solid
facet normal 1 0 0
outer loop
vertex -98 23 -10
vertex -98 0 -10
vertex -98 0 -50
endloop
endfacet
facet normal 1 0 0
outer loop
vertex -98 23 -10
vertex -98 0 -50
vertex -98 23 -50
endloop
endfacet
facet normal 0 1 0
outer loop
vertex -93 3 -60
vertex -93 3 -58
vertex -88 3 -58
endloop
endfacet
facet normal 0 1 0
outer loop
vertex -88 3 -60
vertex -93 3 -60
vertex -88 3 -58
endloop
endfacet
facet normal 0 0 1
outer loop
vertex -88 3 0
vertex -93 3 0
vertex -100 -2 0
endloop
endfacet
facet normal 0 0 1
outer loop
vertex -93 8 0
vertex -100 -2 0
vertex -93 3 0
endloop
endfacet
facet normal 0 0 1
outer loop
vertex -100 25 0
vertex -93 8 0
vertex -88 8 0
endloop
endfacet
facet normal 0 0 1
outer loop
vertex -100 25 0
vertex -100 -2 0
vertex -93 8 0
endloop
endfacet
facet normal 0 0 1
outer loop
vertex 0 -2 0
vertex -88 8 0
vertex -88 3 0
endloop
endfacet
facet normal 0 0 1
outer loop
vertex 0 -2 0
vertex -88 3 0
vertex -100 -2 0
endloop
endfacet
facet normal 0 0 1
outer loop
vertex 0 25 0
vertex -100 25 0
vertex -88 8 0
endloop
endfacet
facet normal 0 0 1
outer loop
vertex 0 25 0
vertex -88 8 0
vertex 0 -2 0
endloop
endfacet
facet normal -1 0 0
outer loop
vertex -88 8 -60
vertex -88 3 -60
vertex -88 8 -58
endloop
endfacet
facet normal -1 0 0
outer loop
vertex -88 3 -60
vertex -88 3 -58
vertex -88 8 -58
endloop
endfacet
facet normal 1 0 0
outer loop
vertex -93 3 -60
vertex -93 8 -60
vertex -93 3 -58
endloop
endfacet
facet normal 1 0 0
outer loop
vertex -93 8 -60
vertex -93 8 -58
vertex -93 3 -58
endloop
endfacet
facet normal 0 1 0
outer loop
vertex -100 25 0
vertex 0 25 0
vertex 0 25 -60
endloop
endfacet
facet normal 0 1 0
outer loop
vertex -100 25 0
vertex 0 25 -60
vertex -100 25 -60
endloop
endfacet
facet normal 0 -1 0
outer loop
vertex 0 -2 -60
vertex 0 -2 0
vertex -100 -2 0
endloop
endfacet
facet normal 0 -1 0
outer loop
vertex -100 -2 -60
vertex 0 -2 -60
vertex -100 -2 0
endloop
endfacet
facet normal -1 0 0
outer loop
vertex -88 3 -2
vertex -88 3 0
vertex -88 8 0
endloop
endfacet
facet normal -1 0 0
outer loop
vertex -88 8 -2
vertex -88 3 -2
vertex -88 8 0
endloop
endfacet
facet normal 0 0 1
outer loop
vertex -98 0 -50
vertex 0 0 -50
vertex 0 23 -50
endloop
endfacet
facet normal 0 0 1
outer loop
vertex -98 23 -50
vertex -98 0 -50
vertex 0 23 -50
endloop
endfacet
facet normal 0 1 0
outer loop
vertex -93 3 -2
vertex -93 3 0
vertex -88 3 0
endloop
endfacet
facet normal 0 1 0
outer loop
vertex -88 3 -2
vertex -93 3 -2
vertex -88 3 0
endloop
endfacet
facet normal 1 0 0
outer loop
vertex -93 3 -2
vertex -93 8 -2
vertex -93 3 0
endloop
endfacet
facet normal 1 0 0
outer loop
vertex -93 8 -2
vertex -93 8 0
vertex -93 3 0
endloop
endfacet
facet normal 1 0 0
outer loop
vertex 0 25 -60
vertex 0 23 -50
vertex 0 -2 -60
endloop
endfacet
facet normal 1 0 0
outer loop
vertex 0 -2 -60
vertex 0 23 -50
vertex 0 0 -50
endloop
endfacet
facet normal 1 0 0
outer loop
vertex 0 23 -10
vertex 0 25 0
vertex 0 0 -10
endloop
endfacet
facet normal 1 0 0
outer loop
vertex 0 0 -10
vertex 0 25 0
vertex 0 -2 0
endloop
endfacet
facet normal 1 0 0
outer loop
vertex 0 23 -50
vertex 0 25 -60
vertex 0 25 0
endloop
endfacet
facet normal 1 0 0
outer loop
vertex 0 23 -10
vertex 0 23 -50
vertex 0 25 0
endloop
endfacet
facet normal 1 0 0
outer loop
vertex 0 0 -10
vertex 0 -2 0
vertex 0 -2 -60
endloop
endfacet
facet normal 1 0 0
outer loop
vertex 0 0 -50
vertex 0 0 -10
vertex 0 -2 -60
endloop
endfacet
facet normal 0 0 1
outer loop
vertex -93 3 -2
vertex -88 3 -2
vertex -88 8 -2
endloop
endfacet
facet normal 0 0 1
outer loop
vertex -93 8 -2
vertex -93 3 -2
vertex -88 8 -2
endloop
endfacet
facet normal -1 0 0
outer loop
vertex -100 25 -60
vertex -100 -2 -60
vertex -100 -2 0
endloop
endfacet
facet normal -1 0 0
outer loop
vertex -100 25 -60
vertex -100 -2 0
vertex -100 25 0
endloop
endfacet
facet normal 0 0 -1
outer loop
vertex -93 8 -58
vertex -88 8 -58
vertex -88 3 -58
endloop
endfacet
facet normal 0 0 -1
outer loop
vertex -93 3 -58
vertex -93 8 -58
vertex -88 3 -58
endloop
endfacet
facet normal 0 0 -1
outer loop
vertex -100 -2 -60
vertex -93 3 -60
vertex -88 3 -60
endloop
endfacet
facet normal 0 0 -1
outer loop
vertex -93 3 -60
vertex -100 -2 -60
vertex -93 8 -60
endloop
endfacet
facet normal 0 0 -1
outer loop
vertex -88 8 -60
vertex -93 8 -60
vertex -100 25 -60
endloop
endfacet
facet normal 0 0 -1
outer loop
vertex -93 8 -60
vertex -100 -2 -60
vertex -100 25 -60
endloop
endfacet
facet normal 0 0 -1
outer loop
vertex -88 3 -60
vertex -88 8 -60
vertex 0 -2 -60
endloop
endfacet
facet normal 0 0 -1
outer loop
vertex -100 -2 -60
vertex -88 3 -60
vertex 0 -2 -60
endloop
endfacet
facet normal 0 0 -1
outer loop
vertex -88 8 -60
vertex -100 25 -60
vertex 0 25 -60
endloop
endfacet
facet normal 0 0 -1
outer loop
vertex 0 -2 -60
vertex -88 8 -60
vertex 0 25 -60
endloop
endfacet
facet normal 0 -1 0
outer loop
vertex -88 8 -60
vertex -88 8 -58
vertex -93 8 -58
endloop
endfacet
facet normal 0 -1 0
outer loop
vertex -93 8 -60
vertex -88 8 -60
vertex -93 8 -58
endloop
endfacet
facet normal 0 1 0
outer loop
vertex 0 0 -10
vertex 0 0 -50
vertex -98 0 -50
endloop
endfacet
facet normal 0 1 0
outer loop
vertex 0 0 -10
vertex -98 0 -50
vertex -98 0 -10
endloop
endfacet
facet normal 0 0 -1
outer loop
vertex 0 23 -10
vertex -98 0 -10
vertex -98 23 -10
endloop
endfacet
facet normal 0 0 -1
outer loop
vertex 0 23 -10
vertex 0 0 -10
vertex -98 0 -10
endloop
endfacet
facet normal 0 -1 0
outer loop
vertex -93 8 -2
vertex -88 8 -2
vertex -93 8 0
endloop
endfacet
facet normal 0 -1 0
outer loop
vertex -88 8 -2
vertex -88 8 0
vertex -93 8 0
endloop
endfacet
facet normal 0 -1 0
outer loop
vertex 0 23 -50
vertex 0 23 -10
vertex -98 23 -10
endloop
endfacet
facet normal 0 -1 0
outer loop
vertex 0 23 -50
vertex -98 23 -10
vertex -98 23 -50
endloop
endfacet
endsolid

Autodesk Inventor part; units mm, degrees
ref_plane "XZ Plane" through (0, 0, 0) normal (0, 1, 0) x (-1, 0, 0)
ref_plane "XY Plane" through (0, 0, 0) normal (0, 0, 1) x (1, 0, 0)
sketch "Эскиз1" plane through (0, 0, 0) normal (1, 0, 0) x (0, 1, 0)
  line L0 (0, 0) -> (25, 0)
  line L1 (25, 0) -> (25, -60)
  line L2 (25, -60) -> (0, -60)
  line L3 (0, -60) -> (0, 0)
  line L4 (0, 0) -> (0, -2)
  line L5 (0, -2) -> (23, -2)
  line L6 (23, -2) -> (23, -58)
  line L7 (23, -58) -> (0, -58)
  line L8 (0, 0) -> (0, -10)
  line L9 (0, -10) -> (23, -10)
  line L10 (0, -10) -> (0, -50)
  line L11 (0, -50) -> (23, -50)
  line L12 (0, 0) -> (-2, 0)
  line L13 (-2, 0) -> (-2, -60)
  line L14 (-2, -60) -> (0, -60)
  line L15 (0, -10) -> (0, -50)
  dimension "d0" = 25
  dimension "d1" = 60
  dimension "d2" = 2
  dimension "d3" = 23
  dimension "d4" = 56
  dimension "d5" = 10
  dimension "d6" = 40
  dimension "d26" = 2
sketch "Эскиз2" plane through (0, 0, 0) normal (0, 0, 1) x (1, 0, 0)
  line L0 (0, 0) -> (0, 25)
  line L1 (0, 25) -> (-100, 25)
  line L2 (-100, 25) -> (-100, 0)
  line L3 (-100, 0) -> (0, 0)
  line L4 (-100, 0) -> (-98, 0)
  line L5 (-98, 0) -> (-98, 23)
  line L6 (-98, 23) -> (-2, 23)
  line L7 (-2, 23) -> (-2, 0)
  line L8 (-98, 0) -> (-93, 0)
  line L9 (-93, 3) -> (-88, 3)
  line L10 (-88, 3) -> (-88, 8)
  line L11 (-88, 8) -> (-93, 8)
  line L12 (-93, 8) -> (-93, 3)
  line L13 (0, 0) -> (0, -2)
  line L14 (0, -2) -> (-100, -2)
  line L15 (-100, -2) -> (-100, 0)
  line L16 (-98, 0) -> (-2, 0)
  dimension "d7" = 25
  dimension "d8" = 100
  dimension "d9" = 2
  dimension "d10" = 23
  dimension "d11" = 96
  dimension "d13" = 3
  dimension "d14" = 5
  dimension "d15" = 5
  dimension "d16" = 88
  dimension "d17" = 17
  dimension "d27" = 2
ref_plane "РабПлоскость3" through (-2, 0, 0) normal (1, 0, 0) x (0, 1, 0)
sketch "Эскиз3" plane through (-2, 0, 0) normal (1, 0, 0) x (0, 1, 0)
  line L0 (0, 0) -> (0, -2)
  line L1 (0, -2) -> (23, -2)
  line L2 (23, -2) -> (23, -58)
  line L3 (23, -58) -> (0, -58)
  line L4 (0, -58) -> (0, -50)
  line L5 (0, -50) -> (23, -50)
  line L6 (23, -50) -> (23, -10)
  line L7 (23, -10) -> (0, -10)
  line L8 (0, -10) -> (0, -2)
  line L9 (0, -50) -> (0, -58)
  dimension "d30" = 2
  dimension "d31" = 23
  dimension "d32" = 56
  dimension "d33" = 8
  dimension "d34" = 40
extrude "Выдавливание5" add sketch "Эскиз2" against normal blind 60 contours L3 L7 L6 L5 L2 L1 L0 | L3 L5 L6 L7
extrude "Выдавливание6" add sketch "Эскиз2" against normal blind 60 contours L13 L14 L15 L3
extrude "Выдавливание7" cut sketch "Эскиз1" against normal blind 98 contours L9 L6 L11 L3
extrude "Выдавливание8" add sketch "Эскиз3" against normal blind 98
